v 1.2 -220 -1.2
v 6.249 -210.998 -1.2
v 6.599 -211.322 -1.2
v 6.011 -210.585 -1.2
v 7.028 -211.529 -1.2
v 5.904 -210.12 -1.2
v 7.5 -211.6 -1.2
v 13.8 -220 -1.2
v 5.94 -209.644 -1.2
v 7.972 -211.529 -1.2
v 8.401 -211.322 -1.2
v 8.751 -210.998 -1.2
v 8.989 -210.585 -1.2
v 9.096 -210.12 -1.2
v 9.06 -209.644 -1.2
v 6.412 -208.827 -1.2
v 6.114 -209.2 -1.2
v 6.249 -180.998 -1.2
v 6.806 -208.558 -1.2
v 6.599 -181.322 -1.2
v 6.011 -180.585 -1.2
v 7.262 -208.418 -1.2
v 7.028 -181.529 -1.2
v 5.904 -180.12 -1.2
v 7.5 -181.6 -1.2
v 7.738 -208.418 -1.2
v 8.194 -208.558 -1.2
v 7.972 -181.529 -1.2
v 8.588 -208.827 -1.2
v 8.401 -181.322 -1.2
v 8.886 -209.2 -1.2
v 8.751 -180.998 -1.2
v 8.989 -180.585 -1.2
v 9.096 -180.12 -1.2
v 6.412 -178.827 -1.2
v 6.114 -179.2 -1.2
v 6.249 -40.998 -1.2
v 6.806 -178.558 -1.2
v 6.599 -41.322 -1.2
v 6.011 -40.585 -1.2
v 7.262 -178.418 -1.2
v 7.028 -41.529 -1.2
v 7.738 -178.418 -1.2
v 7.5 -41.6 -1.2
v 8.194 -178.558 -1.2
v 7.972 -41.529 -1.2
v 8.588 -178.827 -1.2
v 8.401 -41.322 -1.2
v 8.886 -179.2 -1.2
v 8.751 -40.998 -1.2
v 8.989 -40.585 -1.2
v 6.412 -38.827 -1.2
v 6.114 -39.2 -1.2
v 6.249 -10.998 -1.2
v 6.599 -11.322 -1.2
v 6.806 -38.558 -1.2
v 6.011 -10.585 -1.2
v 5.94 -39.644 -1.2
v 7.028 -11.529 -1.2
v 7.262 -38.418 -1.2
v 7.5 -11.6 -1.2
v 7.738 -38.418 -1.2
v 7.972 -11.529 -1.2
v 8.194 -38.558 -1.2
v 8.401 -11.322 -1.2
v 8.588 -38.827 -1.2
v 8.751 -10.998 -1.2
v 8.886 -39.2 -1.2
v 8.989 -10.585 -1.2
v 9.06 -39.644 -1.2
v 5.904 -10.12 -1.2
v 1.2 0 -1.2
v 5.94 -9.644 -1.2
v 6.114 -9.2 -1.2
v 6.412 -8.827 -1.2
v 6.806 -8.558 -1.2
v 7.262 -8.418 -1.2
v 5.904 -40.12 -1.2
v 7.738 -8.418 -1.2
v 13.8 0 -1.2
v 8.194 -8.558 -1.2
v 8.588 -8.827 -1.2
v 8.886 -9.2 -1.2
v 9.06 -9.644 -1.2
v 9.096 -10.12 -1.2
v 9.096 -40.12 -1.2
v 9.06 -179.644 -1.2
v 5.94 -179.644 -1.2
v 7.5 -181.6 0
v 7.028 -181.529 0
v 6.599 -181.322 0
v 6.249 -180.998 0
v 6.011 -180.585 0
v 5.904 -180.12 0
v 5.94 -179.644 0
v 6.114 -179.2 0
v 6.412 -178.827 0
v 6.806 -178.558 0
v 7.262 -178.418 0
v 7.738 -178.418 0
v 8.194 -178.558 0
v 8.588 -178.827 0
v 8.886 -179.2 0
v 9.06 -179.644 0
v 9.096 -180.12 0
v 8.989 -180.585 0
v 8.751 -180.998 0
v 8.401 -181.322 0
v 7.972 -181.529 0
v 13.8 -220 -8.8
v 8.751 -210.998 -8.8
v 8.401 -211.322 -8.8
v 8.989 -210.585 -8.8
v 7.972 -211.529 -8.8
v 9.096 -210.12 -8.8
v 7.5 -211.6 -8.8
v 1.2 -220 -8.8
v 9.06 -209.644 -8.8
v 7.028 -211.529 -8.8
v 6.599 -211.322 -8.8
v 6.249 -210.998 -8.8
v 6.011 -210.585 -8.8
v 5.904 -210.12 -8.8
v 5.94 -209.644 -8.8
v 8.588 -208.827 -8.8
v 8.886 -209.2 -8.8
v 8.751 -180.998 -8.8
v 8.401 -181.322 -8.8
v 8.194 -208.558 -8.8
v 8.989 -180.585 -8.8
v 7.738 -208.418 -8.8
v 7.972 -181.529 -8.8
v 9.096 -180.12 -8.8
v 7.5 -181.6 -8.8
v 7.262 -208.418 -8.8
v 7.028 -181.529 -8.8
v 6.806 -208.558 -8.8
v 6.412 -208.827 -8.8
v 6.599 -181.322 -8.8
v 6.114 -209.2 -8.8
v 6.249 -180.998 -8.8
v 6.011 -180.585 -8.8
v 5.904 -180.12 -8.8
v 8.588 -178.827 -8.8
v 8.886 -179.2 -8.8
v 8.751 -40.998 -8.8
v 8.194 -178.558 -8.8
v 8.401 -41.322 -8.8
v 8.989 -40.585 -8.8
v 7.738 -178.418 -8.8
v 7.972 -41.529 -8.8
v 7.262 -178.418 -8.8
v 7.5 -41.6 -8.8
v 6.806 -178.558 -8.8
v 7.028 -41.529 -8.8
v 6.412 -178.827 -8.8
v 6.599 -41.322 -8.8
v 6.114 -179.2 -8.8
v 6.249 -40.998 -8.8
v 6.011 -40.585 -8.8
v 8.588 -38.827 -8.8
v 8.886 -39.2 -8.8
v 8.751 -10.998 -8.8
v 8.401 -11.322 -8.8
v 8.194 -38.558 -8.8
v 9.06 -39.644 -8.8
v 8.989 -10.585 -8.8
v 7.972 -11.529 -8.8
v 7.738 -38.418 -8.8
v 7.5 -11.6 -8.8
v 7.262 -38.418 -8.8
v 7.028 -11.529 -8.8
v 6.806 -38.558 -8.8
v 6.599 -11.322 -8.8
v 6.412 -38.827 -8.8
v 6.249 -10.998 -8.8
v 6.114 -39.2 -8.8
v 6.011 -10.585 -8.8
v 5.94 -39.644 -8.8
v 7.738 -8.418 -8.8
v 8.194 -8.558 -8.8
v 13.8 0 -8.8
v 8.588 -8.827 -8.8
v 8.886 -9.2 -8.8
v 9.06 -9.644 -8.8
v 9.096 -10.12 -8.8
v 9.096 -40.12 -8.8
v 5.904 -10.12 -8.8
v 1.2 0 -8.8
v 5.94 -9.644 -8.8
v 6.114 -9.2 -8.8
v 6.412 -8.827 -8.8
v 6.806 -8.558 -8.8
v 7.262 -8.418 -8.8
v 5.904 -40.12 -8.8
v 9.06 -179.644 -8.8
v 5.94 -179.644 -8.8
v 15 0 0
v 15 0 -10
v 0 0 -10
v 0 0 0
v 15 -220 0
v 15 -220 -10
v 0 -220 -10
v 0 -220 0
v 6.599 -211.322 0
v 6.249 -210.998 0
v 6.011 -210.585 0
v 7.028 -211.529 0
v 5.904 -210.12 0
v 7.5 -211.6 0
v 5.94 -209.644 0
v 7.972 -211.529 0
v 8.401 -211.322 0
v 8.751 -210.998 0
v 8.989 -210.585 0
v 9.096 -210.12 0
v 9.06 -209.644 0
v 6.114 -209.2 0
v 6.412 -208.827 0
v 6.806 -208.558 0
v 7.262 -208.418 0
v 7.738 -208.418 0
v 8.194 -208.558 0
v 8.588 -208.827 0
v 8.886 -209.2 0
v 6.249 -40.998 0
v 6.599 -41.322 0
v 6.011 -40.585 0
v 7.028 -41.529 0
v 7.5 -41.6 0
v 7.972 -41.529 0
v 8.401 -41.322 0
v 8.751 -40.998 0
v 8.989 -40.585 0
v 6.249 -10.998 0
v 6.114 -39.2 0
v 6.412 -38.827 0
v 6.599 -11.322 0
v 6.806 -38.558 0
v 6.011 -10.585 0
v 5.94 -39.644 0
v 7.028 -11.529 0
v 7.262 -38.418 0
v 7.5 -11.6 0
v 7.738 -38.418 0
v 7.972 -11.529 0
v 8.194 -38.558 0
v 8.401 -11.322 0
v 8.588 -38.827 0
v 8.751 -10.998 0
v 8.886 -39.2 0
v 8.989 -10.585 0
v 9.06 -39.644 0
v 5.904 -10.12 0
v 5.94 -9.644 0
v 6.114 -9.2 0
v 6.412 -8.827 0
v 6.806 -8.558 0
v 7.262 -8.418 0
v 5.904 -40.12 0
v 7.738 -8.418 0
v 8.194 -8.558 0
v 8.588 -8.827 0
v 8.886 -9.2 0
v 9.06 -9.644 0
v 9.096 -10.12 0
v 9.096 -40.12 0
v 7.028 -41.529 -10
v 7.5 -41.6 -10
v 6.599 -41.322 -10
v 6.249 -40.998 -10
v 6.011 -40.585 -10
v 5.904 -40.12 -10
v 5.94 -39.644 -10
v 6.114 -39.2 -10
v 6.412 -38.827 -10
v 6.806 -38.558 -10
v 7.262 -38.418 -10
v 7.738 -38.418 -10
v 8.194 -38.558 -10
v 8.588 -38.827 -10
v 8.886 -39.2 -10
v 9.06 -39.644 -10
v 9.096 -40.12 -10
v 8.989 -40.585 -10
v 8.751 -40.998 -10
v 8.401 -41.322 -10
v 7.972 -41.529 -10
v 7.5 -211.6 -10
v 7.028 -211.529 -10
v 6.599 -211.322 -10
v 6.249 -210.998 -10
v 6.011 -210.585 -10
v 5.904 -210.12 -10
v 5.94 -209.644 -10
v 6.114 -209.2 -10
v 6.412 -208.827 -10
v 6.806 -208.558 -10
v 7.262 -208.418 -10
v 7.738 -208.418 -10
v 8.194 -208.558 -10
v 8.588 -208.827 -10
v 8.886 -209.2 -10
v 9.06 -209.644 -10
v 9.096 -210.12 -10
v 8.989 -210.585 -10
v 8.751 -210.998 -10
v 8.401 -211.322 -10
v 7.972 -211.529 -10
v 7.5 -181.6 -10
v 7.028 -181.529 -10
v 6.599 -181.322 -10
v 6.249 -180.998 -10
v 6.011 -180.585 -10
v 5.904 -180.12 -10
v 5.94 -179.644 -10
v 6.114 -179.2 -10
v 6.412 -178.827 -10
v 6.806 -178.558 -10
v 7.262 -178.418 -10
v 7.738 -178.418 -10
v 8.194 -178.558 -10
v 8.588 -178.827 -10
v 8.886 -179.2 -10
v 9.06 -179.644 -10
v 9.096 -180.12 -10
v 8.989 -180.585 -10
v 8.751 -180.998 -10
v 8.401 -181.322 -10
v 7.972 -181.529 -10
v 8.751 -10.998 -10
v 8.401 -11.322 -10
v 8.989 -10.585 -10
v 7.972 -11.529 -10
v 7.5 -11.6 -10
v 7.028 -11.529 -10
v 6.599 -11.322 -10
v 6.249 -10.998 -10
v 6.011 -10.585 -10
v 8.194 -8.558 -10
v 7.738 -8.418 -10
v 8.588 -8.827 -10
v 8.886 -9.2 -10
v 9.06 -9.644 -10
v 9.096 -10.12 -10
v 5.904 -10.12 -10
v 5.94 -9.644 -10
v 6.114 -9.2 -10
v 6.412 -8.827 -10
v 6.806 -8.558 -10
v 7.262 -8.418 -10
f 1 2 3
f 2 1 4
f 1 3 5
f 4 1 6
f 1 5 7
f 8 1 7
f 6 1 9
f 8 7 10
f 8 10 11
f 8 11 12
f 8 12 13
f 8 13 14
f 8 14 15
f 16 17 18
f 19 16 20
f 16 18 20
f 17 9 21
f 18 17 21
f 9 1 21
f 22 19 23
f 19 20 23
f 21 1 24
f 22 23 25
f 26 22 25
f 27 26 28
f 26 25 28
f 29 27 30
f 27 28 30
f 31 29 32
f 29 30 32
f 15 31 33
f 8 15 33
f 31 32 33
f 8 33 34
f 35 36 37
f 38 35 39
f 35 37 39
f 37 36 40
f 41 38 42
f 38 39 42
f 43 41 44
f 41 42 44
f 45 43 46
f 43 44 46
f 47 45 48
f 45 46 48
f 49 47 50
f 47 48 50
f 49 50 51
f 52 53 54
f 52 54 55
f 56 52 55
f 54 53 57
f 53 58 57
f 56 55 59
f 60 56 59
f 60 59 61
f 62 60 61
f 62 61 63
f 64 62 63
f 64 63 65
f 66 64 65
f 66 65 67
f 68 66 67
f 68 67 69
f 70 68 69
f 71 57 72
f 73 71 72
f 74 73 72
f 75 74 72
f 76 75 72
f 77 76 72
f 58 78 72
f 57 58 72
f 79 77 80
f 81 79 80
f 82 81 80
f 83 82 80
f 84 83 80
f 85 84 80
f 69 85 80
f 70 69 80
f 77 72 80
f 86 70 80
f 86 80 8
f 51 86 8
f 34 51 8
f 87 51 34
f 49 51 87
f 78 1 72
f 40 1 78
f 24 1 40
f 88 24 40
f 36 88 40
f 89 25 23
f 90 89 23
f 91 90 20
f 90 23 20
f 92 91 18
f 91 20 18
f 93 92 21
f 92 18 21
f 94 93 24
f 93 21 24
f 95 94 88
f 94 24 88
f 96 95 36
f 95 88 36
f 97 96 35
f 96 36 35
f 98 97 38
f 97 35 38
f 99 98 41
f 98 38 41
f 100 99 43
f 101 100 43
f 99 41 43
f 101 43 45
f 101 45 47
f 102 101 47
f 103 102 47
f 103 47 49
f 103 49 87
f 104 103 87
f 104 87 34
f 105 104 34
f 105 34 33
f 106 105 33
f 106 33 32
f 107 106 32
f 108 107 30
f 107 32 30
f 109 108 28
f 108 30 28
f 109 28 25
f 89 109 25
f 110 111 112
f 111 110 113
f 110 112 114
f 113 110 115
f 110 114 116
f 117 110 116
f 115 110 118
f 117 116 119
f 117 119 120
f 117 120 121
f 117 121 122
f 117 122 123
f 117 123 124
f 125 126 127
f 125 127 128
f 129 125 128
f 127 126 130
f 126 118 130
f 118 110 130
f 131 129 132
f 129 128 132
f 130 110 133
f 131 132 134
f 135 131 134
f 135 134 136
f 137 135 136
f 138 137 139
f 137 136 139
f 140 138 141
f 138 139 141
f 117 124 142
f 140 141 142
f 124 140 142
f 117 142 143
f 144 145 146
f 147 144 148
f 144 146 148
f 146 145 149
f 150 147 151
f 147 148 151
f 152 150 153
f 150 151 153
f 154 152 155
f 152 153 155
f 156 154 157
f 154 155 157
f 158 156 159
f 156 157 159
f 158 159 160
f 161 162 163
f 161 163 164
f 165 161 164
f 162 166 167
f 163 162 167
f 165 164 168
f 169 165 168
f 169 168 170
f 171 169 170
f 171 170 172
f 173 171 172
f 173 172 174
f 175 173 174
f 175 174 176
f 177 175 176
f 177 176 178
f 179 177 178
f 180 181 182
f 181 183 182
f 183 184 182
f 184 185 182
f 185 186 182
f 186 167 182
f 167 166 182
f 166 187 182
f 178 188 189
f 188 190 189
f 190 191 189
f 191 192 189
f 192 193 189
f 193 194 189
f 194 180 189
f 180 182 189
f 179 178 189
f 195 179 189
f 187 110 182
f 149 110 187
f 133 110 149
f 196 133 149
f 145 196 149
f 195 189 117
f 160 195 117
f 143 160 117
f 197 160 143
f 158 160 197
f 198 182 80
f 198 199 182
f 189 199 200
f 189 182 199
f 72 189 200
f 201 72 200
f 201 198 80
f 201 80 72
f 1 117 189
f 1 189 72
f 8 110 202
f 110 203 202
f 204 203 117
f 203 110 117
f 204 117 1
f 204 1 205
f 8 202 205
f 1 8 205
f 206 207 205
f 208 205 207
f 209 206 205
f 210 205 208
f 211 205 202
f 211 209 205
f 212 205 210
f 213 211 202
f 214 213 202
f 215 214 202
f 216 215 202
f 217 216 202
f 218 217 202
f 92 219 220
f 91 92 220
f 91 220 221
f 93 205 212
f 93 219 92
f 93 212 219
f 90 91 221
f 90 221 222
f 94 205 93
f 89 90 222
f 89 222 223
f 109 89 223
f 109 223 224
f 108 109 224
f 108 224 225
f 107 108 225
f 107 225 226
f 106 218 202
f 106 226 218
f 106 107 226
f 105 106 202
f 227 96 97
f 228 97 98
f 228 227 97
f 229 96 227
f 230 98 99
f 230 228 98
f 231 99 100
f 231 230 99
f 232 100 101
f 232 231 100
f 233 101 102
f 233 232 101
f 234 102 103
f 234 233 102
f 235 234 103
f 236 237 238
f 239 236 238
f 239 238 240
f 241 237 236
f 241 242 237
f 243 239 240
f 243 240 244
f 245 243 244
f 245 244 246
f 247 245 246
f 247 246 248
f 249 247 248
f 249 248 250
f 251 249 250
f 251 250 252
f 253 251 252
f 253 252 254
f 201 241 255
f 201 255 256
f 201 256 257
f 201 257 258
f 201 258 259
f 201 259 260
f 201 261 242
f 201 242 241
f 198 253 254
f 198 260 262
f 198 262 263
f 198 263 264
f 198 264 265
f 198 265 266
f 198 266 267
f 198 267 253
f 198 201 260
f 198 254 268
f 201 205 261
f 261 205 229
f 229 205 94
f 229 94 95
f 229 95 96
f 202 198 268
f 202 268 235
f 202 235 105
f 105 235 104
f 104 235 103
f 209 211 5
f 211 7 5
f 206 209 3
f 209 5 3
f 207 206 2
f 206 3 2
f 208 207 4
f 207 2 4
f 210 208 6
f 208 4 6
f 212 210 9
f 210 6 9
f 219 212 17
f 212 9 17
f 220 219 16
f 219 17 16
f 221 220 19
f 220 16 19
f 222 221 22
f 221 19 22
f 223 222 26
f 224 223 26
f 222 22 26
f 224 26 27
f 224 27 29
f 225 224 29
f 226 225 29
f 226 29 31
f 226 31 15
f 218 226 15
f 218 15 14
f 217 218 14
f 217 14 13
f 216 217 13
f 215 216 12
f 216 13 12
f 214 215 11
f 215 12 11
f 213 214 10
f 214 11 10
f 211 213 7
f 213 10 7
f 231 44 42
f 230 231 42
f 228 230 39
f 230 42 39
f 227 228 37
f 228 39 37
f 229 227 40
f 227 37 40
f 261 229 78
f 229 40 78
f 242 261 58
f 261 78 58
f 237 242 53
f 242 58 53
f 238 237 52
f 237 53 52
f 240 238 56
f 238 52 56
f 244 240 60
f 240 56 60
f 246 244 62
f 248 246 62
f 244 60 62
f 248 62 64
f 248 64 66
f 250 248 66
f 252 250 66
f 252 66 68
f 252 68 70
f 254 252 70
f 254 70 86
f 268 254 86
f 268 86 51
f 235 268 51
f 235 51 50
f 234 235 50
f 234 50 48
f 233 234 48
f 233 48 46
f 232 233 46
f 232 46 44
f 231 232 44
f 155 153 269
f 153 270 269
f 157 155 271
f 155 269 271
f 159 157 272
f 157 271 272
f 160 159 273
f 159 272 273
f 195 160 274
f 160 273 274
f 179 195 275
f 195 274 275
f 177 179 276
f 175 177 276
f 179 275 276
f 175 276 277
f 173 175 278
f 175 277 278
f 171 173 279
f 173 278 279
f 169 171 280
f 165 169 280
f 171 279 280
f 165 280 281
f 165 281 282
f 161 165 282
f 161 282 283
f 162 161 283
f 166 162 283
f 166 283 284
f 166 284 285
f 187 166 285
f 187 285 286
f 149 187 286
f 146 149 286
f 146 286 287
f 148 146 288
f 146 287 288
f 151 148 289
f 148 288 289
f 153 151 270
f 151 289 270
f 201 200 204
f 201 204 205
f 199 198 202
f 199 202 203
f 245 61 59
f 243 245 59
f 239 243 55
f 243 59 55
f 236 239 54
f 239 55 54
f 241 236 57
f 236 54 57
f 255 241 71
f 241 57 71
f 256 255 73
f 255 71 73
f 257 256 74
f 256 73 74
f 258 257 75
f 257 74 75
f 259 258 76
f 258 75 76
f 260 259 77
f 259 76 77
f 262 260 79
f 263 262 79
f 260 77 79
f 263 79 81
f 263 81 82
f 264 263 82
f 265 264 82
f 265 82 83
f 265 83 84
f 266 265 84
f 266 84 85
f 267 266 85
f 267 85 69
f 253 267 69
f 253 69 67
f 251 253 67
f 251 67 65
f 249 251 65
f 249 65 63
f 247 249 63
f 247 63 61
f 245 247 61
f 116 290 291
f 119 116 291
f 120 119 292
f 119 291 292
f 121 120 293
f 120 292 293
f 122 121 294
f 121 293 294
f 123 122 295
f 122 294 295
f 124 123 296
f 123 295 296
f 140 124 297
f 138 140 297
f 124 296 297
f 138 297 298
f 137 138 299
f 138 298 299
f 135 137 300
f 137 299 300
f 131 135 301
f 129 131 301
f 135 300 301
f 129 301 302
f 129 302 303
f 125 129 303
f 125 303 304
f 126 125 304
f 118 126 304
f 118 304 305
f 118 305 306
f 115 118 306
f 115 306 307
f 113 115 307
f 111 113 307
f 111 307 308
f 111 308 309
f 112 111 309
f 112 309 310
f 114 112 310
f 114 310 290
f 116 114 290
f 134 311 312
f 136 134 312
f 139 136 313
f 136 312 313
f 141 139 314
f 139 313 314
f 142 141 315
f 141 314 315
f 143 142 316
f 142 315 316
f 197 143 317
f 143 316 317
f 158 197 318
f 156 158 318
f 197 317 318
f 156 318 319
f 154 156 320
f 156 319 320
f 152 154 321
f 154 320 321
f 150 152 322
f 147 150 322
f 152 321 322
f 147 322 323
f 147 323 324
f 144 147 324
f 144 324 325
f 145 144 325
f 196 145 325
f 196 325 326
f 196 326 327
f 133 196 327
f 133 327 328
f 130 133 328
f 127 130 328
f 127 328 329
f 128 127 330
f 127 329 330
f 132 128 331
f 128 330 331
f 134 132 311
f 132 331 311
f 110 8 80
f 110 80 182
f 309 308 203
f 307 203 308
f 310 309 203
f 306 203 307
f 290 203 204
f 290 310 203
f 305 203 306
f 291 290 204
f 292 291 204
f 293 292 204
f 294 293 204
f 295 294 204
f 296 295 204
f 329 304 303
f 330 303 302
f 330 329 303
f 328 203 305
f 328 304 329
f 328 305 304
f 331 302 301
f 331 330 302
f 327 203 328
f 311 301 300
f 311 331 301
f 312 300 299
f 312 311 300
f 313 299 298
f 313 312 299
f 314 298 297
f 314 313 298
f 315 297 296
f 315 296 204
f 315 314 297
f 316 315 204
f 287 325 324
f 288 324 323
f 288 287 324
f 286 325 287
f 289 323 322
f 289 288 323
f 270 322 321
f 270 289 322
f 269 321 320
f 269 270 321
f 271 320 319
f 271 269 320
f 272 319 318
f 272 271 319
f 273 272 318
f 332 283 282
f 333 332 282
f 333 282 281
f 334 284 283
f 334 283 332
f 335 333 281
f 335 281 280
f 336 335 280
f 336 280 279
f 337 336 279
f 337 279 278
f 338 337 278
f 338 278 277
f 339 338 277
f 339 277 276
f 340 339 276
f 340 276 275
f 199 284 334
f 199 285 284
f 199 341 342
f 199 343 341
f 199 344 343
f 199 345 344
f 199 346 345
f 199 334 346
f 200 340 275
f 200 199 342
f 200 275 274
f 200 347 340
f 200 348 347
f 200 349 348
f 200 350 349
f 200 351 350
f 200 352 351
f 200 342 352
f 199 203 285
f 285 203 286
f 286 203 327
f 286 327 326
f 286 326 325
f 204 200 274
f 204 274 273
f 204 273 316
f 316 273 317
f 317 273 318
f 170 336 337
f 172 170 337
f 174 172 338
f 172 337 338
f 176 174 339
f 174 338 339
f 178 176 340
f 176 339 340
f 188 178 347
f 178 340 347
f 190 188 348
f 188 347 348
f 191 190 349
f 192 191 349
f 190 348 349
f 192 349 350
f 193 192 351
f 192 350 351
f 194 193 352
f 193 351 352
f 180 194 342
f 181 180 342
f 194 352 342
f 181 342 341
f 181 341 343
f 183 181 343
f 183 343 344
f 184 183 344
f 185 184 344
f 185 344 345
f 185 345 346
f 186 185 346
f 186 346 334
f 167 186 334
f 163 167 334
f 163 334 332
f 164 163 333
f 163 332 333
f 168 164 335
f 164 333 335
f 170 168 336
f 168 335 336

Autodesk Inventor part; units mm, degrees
ref_plane "YZ Plane" through (0, 0, 0) normal (1, 0, 0) x (0, 1, 0)
ref_plane "XZ Plane" through (0, 0, 0) normal (0, 1, 0) x (-1, 0, 0)
ref_plane "XY Plane" through (0, 0, 0) normal (0, 0, 1) x (1, 0, 0)
sketch "スケッチ1" plane through (0, 0, 0) normal (0, 1, 0) x (-1, 0, 0)
  line L0 (0, 0) -> (-15, 0)
  line L1 (-15, 0) -> (-15, -10)
  line L2 (-15, -10) -> (0, -10)
  line L3 (0, -10) -> (0, 0)
  dimension "d0" = 15
  dimension "d1" = 10
extrude "押し出し1" add sketch "スケッチ1" against normal blind 220
shell "シェル1" thickness 1.2 removed faces 2 at (10, 0, -3.3333) at (10, -220, -3.3333)
sketch "スケッチ2" plane through (0, 0, 0) normal (0, 0, 1) x (1, 0, 0)
  line L0 (0, 0) -> (15, 0) projected
  line L1 (15, 0) -> (15, -220) projected
  line L2 (15, -220) -> (0, -220) projected
  point P0 (7.5, -10)
  point P1 (7.5, 0)
  point P2 (7.5, -40)
  point P3 (7.5, -210)
  point P4 (7.5, -210)
  point P5 (7.5, -180)
  dimension "d5" = 10
  dimension "d6" = 7.5
  dimension "d7" = 7.5
  dimension "d8" = 30
  dimension "d9" = 10
  dimension "d10" = 7.5
  dimension "d11" = 30
  dimension "d12" = 7.5
hole "穴1" at (7.5, -10, 0) at (7.5, -40, 0) at (7.5, -210, 0) at (7.5, -180, 0) direction (0, 0, -1) diameter 3.2 end through all
properties part number "left_ASP" material "アルミニウム 6061"
